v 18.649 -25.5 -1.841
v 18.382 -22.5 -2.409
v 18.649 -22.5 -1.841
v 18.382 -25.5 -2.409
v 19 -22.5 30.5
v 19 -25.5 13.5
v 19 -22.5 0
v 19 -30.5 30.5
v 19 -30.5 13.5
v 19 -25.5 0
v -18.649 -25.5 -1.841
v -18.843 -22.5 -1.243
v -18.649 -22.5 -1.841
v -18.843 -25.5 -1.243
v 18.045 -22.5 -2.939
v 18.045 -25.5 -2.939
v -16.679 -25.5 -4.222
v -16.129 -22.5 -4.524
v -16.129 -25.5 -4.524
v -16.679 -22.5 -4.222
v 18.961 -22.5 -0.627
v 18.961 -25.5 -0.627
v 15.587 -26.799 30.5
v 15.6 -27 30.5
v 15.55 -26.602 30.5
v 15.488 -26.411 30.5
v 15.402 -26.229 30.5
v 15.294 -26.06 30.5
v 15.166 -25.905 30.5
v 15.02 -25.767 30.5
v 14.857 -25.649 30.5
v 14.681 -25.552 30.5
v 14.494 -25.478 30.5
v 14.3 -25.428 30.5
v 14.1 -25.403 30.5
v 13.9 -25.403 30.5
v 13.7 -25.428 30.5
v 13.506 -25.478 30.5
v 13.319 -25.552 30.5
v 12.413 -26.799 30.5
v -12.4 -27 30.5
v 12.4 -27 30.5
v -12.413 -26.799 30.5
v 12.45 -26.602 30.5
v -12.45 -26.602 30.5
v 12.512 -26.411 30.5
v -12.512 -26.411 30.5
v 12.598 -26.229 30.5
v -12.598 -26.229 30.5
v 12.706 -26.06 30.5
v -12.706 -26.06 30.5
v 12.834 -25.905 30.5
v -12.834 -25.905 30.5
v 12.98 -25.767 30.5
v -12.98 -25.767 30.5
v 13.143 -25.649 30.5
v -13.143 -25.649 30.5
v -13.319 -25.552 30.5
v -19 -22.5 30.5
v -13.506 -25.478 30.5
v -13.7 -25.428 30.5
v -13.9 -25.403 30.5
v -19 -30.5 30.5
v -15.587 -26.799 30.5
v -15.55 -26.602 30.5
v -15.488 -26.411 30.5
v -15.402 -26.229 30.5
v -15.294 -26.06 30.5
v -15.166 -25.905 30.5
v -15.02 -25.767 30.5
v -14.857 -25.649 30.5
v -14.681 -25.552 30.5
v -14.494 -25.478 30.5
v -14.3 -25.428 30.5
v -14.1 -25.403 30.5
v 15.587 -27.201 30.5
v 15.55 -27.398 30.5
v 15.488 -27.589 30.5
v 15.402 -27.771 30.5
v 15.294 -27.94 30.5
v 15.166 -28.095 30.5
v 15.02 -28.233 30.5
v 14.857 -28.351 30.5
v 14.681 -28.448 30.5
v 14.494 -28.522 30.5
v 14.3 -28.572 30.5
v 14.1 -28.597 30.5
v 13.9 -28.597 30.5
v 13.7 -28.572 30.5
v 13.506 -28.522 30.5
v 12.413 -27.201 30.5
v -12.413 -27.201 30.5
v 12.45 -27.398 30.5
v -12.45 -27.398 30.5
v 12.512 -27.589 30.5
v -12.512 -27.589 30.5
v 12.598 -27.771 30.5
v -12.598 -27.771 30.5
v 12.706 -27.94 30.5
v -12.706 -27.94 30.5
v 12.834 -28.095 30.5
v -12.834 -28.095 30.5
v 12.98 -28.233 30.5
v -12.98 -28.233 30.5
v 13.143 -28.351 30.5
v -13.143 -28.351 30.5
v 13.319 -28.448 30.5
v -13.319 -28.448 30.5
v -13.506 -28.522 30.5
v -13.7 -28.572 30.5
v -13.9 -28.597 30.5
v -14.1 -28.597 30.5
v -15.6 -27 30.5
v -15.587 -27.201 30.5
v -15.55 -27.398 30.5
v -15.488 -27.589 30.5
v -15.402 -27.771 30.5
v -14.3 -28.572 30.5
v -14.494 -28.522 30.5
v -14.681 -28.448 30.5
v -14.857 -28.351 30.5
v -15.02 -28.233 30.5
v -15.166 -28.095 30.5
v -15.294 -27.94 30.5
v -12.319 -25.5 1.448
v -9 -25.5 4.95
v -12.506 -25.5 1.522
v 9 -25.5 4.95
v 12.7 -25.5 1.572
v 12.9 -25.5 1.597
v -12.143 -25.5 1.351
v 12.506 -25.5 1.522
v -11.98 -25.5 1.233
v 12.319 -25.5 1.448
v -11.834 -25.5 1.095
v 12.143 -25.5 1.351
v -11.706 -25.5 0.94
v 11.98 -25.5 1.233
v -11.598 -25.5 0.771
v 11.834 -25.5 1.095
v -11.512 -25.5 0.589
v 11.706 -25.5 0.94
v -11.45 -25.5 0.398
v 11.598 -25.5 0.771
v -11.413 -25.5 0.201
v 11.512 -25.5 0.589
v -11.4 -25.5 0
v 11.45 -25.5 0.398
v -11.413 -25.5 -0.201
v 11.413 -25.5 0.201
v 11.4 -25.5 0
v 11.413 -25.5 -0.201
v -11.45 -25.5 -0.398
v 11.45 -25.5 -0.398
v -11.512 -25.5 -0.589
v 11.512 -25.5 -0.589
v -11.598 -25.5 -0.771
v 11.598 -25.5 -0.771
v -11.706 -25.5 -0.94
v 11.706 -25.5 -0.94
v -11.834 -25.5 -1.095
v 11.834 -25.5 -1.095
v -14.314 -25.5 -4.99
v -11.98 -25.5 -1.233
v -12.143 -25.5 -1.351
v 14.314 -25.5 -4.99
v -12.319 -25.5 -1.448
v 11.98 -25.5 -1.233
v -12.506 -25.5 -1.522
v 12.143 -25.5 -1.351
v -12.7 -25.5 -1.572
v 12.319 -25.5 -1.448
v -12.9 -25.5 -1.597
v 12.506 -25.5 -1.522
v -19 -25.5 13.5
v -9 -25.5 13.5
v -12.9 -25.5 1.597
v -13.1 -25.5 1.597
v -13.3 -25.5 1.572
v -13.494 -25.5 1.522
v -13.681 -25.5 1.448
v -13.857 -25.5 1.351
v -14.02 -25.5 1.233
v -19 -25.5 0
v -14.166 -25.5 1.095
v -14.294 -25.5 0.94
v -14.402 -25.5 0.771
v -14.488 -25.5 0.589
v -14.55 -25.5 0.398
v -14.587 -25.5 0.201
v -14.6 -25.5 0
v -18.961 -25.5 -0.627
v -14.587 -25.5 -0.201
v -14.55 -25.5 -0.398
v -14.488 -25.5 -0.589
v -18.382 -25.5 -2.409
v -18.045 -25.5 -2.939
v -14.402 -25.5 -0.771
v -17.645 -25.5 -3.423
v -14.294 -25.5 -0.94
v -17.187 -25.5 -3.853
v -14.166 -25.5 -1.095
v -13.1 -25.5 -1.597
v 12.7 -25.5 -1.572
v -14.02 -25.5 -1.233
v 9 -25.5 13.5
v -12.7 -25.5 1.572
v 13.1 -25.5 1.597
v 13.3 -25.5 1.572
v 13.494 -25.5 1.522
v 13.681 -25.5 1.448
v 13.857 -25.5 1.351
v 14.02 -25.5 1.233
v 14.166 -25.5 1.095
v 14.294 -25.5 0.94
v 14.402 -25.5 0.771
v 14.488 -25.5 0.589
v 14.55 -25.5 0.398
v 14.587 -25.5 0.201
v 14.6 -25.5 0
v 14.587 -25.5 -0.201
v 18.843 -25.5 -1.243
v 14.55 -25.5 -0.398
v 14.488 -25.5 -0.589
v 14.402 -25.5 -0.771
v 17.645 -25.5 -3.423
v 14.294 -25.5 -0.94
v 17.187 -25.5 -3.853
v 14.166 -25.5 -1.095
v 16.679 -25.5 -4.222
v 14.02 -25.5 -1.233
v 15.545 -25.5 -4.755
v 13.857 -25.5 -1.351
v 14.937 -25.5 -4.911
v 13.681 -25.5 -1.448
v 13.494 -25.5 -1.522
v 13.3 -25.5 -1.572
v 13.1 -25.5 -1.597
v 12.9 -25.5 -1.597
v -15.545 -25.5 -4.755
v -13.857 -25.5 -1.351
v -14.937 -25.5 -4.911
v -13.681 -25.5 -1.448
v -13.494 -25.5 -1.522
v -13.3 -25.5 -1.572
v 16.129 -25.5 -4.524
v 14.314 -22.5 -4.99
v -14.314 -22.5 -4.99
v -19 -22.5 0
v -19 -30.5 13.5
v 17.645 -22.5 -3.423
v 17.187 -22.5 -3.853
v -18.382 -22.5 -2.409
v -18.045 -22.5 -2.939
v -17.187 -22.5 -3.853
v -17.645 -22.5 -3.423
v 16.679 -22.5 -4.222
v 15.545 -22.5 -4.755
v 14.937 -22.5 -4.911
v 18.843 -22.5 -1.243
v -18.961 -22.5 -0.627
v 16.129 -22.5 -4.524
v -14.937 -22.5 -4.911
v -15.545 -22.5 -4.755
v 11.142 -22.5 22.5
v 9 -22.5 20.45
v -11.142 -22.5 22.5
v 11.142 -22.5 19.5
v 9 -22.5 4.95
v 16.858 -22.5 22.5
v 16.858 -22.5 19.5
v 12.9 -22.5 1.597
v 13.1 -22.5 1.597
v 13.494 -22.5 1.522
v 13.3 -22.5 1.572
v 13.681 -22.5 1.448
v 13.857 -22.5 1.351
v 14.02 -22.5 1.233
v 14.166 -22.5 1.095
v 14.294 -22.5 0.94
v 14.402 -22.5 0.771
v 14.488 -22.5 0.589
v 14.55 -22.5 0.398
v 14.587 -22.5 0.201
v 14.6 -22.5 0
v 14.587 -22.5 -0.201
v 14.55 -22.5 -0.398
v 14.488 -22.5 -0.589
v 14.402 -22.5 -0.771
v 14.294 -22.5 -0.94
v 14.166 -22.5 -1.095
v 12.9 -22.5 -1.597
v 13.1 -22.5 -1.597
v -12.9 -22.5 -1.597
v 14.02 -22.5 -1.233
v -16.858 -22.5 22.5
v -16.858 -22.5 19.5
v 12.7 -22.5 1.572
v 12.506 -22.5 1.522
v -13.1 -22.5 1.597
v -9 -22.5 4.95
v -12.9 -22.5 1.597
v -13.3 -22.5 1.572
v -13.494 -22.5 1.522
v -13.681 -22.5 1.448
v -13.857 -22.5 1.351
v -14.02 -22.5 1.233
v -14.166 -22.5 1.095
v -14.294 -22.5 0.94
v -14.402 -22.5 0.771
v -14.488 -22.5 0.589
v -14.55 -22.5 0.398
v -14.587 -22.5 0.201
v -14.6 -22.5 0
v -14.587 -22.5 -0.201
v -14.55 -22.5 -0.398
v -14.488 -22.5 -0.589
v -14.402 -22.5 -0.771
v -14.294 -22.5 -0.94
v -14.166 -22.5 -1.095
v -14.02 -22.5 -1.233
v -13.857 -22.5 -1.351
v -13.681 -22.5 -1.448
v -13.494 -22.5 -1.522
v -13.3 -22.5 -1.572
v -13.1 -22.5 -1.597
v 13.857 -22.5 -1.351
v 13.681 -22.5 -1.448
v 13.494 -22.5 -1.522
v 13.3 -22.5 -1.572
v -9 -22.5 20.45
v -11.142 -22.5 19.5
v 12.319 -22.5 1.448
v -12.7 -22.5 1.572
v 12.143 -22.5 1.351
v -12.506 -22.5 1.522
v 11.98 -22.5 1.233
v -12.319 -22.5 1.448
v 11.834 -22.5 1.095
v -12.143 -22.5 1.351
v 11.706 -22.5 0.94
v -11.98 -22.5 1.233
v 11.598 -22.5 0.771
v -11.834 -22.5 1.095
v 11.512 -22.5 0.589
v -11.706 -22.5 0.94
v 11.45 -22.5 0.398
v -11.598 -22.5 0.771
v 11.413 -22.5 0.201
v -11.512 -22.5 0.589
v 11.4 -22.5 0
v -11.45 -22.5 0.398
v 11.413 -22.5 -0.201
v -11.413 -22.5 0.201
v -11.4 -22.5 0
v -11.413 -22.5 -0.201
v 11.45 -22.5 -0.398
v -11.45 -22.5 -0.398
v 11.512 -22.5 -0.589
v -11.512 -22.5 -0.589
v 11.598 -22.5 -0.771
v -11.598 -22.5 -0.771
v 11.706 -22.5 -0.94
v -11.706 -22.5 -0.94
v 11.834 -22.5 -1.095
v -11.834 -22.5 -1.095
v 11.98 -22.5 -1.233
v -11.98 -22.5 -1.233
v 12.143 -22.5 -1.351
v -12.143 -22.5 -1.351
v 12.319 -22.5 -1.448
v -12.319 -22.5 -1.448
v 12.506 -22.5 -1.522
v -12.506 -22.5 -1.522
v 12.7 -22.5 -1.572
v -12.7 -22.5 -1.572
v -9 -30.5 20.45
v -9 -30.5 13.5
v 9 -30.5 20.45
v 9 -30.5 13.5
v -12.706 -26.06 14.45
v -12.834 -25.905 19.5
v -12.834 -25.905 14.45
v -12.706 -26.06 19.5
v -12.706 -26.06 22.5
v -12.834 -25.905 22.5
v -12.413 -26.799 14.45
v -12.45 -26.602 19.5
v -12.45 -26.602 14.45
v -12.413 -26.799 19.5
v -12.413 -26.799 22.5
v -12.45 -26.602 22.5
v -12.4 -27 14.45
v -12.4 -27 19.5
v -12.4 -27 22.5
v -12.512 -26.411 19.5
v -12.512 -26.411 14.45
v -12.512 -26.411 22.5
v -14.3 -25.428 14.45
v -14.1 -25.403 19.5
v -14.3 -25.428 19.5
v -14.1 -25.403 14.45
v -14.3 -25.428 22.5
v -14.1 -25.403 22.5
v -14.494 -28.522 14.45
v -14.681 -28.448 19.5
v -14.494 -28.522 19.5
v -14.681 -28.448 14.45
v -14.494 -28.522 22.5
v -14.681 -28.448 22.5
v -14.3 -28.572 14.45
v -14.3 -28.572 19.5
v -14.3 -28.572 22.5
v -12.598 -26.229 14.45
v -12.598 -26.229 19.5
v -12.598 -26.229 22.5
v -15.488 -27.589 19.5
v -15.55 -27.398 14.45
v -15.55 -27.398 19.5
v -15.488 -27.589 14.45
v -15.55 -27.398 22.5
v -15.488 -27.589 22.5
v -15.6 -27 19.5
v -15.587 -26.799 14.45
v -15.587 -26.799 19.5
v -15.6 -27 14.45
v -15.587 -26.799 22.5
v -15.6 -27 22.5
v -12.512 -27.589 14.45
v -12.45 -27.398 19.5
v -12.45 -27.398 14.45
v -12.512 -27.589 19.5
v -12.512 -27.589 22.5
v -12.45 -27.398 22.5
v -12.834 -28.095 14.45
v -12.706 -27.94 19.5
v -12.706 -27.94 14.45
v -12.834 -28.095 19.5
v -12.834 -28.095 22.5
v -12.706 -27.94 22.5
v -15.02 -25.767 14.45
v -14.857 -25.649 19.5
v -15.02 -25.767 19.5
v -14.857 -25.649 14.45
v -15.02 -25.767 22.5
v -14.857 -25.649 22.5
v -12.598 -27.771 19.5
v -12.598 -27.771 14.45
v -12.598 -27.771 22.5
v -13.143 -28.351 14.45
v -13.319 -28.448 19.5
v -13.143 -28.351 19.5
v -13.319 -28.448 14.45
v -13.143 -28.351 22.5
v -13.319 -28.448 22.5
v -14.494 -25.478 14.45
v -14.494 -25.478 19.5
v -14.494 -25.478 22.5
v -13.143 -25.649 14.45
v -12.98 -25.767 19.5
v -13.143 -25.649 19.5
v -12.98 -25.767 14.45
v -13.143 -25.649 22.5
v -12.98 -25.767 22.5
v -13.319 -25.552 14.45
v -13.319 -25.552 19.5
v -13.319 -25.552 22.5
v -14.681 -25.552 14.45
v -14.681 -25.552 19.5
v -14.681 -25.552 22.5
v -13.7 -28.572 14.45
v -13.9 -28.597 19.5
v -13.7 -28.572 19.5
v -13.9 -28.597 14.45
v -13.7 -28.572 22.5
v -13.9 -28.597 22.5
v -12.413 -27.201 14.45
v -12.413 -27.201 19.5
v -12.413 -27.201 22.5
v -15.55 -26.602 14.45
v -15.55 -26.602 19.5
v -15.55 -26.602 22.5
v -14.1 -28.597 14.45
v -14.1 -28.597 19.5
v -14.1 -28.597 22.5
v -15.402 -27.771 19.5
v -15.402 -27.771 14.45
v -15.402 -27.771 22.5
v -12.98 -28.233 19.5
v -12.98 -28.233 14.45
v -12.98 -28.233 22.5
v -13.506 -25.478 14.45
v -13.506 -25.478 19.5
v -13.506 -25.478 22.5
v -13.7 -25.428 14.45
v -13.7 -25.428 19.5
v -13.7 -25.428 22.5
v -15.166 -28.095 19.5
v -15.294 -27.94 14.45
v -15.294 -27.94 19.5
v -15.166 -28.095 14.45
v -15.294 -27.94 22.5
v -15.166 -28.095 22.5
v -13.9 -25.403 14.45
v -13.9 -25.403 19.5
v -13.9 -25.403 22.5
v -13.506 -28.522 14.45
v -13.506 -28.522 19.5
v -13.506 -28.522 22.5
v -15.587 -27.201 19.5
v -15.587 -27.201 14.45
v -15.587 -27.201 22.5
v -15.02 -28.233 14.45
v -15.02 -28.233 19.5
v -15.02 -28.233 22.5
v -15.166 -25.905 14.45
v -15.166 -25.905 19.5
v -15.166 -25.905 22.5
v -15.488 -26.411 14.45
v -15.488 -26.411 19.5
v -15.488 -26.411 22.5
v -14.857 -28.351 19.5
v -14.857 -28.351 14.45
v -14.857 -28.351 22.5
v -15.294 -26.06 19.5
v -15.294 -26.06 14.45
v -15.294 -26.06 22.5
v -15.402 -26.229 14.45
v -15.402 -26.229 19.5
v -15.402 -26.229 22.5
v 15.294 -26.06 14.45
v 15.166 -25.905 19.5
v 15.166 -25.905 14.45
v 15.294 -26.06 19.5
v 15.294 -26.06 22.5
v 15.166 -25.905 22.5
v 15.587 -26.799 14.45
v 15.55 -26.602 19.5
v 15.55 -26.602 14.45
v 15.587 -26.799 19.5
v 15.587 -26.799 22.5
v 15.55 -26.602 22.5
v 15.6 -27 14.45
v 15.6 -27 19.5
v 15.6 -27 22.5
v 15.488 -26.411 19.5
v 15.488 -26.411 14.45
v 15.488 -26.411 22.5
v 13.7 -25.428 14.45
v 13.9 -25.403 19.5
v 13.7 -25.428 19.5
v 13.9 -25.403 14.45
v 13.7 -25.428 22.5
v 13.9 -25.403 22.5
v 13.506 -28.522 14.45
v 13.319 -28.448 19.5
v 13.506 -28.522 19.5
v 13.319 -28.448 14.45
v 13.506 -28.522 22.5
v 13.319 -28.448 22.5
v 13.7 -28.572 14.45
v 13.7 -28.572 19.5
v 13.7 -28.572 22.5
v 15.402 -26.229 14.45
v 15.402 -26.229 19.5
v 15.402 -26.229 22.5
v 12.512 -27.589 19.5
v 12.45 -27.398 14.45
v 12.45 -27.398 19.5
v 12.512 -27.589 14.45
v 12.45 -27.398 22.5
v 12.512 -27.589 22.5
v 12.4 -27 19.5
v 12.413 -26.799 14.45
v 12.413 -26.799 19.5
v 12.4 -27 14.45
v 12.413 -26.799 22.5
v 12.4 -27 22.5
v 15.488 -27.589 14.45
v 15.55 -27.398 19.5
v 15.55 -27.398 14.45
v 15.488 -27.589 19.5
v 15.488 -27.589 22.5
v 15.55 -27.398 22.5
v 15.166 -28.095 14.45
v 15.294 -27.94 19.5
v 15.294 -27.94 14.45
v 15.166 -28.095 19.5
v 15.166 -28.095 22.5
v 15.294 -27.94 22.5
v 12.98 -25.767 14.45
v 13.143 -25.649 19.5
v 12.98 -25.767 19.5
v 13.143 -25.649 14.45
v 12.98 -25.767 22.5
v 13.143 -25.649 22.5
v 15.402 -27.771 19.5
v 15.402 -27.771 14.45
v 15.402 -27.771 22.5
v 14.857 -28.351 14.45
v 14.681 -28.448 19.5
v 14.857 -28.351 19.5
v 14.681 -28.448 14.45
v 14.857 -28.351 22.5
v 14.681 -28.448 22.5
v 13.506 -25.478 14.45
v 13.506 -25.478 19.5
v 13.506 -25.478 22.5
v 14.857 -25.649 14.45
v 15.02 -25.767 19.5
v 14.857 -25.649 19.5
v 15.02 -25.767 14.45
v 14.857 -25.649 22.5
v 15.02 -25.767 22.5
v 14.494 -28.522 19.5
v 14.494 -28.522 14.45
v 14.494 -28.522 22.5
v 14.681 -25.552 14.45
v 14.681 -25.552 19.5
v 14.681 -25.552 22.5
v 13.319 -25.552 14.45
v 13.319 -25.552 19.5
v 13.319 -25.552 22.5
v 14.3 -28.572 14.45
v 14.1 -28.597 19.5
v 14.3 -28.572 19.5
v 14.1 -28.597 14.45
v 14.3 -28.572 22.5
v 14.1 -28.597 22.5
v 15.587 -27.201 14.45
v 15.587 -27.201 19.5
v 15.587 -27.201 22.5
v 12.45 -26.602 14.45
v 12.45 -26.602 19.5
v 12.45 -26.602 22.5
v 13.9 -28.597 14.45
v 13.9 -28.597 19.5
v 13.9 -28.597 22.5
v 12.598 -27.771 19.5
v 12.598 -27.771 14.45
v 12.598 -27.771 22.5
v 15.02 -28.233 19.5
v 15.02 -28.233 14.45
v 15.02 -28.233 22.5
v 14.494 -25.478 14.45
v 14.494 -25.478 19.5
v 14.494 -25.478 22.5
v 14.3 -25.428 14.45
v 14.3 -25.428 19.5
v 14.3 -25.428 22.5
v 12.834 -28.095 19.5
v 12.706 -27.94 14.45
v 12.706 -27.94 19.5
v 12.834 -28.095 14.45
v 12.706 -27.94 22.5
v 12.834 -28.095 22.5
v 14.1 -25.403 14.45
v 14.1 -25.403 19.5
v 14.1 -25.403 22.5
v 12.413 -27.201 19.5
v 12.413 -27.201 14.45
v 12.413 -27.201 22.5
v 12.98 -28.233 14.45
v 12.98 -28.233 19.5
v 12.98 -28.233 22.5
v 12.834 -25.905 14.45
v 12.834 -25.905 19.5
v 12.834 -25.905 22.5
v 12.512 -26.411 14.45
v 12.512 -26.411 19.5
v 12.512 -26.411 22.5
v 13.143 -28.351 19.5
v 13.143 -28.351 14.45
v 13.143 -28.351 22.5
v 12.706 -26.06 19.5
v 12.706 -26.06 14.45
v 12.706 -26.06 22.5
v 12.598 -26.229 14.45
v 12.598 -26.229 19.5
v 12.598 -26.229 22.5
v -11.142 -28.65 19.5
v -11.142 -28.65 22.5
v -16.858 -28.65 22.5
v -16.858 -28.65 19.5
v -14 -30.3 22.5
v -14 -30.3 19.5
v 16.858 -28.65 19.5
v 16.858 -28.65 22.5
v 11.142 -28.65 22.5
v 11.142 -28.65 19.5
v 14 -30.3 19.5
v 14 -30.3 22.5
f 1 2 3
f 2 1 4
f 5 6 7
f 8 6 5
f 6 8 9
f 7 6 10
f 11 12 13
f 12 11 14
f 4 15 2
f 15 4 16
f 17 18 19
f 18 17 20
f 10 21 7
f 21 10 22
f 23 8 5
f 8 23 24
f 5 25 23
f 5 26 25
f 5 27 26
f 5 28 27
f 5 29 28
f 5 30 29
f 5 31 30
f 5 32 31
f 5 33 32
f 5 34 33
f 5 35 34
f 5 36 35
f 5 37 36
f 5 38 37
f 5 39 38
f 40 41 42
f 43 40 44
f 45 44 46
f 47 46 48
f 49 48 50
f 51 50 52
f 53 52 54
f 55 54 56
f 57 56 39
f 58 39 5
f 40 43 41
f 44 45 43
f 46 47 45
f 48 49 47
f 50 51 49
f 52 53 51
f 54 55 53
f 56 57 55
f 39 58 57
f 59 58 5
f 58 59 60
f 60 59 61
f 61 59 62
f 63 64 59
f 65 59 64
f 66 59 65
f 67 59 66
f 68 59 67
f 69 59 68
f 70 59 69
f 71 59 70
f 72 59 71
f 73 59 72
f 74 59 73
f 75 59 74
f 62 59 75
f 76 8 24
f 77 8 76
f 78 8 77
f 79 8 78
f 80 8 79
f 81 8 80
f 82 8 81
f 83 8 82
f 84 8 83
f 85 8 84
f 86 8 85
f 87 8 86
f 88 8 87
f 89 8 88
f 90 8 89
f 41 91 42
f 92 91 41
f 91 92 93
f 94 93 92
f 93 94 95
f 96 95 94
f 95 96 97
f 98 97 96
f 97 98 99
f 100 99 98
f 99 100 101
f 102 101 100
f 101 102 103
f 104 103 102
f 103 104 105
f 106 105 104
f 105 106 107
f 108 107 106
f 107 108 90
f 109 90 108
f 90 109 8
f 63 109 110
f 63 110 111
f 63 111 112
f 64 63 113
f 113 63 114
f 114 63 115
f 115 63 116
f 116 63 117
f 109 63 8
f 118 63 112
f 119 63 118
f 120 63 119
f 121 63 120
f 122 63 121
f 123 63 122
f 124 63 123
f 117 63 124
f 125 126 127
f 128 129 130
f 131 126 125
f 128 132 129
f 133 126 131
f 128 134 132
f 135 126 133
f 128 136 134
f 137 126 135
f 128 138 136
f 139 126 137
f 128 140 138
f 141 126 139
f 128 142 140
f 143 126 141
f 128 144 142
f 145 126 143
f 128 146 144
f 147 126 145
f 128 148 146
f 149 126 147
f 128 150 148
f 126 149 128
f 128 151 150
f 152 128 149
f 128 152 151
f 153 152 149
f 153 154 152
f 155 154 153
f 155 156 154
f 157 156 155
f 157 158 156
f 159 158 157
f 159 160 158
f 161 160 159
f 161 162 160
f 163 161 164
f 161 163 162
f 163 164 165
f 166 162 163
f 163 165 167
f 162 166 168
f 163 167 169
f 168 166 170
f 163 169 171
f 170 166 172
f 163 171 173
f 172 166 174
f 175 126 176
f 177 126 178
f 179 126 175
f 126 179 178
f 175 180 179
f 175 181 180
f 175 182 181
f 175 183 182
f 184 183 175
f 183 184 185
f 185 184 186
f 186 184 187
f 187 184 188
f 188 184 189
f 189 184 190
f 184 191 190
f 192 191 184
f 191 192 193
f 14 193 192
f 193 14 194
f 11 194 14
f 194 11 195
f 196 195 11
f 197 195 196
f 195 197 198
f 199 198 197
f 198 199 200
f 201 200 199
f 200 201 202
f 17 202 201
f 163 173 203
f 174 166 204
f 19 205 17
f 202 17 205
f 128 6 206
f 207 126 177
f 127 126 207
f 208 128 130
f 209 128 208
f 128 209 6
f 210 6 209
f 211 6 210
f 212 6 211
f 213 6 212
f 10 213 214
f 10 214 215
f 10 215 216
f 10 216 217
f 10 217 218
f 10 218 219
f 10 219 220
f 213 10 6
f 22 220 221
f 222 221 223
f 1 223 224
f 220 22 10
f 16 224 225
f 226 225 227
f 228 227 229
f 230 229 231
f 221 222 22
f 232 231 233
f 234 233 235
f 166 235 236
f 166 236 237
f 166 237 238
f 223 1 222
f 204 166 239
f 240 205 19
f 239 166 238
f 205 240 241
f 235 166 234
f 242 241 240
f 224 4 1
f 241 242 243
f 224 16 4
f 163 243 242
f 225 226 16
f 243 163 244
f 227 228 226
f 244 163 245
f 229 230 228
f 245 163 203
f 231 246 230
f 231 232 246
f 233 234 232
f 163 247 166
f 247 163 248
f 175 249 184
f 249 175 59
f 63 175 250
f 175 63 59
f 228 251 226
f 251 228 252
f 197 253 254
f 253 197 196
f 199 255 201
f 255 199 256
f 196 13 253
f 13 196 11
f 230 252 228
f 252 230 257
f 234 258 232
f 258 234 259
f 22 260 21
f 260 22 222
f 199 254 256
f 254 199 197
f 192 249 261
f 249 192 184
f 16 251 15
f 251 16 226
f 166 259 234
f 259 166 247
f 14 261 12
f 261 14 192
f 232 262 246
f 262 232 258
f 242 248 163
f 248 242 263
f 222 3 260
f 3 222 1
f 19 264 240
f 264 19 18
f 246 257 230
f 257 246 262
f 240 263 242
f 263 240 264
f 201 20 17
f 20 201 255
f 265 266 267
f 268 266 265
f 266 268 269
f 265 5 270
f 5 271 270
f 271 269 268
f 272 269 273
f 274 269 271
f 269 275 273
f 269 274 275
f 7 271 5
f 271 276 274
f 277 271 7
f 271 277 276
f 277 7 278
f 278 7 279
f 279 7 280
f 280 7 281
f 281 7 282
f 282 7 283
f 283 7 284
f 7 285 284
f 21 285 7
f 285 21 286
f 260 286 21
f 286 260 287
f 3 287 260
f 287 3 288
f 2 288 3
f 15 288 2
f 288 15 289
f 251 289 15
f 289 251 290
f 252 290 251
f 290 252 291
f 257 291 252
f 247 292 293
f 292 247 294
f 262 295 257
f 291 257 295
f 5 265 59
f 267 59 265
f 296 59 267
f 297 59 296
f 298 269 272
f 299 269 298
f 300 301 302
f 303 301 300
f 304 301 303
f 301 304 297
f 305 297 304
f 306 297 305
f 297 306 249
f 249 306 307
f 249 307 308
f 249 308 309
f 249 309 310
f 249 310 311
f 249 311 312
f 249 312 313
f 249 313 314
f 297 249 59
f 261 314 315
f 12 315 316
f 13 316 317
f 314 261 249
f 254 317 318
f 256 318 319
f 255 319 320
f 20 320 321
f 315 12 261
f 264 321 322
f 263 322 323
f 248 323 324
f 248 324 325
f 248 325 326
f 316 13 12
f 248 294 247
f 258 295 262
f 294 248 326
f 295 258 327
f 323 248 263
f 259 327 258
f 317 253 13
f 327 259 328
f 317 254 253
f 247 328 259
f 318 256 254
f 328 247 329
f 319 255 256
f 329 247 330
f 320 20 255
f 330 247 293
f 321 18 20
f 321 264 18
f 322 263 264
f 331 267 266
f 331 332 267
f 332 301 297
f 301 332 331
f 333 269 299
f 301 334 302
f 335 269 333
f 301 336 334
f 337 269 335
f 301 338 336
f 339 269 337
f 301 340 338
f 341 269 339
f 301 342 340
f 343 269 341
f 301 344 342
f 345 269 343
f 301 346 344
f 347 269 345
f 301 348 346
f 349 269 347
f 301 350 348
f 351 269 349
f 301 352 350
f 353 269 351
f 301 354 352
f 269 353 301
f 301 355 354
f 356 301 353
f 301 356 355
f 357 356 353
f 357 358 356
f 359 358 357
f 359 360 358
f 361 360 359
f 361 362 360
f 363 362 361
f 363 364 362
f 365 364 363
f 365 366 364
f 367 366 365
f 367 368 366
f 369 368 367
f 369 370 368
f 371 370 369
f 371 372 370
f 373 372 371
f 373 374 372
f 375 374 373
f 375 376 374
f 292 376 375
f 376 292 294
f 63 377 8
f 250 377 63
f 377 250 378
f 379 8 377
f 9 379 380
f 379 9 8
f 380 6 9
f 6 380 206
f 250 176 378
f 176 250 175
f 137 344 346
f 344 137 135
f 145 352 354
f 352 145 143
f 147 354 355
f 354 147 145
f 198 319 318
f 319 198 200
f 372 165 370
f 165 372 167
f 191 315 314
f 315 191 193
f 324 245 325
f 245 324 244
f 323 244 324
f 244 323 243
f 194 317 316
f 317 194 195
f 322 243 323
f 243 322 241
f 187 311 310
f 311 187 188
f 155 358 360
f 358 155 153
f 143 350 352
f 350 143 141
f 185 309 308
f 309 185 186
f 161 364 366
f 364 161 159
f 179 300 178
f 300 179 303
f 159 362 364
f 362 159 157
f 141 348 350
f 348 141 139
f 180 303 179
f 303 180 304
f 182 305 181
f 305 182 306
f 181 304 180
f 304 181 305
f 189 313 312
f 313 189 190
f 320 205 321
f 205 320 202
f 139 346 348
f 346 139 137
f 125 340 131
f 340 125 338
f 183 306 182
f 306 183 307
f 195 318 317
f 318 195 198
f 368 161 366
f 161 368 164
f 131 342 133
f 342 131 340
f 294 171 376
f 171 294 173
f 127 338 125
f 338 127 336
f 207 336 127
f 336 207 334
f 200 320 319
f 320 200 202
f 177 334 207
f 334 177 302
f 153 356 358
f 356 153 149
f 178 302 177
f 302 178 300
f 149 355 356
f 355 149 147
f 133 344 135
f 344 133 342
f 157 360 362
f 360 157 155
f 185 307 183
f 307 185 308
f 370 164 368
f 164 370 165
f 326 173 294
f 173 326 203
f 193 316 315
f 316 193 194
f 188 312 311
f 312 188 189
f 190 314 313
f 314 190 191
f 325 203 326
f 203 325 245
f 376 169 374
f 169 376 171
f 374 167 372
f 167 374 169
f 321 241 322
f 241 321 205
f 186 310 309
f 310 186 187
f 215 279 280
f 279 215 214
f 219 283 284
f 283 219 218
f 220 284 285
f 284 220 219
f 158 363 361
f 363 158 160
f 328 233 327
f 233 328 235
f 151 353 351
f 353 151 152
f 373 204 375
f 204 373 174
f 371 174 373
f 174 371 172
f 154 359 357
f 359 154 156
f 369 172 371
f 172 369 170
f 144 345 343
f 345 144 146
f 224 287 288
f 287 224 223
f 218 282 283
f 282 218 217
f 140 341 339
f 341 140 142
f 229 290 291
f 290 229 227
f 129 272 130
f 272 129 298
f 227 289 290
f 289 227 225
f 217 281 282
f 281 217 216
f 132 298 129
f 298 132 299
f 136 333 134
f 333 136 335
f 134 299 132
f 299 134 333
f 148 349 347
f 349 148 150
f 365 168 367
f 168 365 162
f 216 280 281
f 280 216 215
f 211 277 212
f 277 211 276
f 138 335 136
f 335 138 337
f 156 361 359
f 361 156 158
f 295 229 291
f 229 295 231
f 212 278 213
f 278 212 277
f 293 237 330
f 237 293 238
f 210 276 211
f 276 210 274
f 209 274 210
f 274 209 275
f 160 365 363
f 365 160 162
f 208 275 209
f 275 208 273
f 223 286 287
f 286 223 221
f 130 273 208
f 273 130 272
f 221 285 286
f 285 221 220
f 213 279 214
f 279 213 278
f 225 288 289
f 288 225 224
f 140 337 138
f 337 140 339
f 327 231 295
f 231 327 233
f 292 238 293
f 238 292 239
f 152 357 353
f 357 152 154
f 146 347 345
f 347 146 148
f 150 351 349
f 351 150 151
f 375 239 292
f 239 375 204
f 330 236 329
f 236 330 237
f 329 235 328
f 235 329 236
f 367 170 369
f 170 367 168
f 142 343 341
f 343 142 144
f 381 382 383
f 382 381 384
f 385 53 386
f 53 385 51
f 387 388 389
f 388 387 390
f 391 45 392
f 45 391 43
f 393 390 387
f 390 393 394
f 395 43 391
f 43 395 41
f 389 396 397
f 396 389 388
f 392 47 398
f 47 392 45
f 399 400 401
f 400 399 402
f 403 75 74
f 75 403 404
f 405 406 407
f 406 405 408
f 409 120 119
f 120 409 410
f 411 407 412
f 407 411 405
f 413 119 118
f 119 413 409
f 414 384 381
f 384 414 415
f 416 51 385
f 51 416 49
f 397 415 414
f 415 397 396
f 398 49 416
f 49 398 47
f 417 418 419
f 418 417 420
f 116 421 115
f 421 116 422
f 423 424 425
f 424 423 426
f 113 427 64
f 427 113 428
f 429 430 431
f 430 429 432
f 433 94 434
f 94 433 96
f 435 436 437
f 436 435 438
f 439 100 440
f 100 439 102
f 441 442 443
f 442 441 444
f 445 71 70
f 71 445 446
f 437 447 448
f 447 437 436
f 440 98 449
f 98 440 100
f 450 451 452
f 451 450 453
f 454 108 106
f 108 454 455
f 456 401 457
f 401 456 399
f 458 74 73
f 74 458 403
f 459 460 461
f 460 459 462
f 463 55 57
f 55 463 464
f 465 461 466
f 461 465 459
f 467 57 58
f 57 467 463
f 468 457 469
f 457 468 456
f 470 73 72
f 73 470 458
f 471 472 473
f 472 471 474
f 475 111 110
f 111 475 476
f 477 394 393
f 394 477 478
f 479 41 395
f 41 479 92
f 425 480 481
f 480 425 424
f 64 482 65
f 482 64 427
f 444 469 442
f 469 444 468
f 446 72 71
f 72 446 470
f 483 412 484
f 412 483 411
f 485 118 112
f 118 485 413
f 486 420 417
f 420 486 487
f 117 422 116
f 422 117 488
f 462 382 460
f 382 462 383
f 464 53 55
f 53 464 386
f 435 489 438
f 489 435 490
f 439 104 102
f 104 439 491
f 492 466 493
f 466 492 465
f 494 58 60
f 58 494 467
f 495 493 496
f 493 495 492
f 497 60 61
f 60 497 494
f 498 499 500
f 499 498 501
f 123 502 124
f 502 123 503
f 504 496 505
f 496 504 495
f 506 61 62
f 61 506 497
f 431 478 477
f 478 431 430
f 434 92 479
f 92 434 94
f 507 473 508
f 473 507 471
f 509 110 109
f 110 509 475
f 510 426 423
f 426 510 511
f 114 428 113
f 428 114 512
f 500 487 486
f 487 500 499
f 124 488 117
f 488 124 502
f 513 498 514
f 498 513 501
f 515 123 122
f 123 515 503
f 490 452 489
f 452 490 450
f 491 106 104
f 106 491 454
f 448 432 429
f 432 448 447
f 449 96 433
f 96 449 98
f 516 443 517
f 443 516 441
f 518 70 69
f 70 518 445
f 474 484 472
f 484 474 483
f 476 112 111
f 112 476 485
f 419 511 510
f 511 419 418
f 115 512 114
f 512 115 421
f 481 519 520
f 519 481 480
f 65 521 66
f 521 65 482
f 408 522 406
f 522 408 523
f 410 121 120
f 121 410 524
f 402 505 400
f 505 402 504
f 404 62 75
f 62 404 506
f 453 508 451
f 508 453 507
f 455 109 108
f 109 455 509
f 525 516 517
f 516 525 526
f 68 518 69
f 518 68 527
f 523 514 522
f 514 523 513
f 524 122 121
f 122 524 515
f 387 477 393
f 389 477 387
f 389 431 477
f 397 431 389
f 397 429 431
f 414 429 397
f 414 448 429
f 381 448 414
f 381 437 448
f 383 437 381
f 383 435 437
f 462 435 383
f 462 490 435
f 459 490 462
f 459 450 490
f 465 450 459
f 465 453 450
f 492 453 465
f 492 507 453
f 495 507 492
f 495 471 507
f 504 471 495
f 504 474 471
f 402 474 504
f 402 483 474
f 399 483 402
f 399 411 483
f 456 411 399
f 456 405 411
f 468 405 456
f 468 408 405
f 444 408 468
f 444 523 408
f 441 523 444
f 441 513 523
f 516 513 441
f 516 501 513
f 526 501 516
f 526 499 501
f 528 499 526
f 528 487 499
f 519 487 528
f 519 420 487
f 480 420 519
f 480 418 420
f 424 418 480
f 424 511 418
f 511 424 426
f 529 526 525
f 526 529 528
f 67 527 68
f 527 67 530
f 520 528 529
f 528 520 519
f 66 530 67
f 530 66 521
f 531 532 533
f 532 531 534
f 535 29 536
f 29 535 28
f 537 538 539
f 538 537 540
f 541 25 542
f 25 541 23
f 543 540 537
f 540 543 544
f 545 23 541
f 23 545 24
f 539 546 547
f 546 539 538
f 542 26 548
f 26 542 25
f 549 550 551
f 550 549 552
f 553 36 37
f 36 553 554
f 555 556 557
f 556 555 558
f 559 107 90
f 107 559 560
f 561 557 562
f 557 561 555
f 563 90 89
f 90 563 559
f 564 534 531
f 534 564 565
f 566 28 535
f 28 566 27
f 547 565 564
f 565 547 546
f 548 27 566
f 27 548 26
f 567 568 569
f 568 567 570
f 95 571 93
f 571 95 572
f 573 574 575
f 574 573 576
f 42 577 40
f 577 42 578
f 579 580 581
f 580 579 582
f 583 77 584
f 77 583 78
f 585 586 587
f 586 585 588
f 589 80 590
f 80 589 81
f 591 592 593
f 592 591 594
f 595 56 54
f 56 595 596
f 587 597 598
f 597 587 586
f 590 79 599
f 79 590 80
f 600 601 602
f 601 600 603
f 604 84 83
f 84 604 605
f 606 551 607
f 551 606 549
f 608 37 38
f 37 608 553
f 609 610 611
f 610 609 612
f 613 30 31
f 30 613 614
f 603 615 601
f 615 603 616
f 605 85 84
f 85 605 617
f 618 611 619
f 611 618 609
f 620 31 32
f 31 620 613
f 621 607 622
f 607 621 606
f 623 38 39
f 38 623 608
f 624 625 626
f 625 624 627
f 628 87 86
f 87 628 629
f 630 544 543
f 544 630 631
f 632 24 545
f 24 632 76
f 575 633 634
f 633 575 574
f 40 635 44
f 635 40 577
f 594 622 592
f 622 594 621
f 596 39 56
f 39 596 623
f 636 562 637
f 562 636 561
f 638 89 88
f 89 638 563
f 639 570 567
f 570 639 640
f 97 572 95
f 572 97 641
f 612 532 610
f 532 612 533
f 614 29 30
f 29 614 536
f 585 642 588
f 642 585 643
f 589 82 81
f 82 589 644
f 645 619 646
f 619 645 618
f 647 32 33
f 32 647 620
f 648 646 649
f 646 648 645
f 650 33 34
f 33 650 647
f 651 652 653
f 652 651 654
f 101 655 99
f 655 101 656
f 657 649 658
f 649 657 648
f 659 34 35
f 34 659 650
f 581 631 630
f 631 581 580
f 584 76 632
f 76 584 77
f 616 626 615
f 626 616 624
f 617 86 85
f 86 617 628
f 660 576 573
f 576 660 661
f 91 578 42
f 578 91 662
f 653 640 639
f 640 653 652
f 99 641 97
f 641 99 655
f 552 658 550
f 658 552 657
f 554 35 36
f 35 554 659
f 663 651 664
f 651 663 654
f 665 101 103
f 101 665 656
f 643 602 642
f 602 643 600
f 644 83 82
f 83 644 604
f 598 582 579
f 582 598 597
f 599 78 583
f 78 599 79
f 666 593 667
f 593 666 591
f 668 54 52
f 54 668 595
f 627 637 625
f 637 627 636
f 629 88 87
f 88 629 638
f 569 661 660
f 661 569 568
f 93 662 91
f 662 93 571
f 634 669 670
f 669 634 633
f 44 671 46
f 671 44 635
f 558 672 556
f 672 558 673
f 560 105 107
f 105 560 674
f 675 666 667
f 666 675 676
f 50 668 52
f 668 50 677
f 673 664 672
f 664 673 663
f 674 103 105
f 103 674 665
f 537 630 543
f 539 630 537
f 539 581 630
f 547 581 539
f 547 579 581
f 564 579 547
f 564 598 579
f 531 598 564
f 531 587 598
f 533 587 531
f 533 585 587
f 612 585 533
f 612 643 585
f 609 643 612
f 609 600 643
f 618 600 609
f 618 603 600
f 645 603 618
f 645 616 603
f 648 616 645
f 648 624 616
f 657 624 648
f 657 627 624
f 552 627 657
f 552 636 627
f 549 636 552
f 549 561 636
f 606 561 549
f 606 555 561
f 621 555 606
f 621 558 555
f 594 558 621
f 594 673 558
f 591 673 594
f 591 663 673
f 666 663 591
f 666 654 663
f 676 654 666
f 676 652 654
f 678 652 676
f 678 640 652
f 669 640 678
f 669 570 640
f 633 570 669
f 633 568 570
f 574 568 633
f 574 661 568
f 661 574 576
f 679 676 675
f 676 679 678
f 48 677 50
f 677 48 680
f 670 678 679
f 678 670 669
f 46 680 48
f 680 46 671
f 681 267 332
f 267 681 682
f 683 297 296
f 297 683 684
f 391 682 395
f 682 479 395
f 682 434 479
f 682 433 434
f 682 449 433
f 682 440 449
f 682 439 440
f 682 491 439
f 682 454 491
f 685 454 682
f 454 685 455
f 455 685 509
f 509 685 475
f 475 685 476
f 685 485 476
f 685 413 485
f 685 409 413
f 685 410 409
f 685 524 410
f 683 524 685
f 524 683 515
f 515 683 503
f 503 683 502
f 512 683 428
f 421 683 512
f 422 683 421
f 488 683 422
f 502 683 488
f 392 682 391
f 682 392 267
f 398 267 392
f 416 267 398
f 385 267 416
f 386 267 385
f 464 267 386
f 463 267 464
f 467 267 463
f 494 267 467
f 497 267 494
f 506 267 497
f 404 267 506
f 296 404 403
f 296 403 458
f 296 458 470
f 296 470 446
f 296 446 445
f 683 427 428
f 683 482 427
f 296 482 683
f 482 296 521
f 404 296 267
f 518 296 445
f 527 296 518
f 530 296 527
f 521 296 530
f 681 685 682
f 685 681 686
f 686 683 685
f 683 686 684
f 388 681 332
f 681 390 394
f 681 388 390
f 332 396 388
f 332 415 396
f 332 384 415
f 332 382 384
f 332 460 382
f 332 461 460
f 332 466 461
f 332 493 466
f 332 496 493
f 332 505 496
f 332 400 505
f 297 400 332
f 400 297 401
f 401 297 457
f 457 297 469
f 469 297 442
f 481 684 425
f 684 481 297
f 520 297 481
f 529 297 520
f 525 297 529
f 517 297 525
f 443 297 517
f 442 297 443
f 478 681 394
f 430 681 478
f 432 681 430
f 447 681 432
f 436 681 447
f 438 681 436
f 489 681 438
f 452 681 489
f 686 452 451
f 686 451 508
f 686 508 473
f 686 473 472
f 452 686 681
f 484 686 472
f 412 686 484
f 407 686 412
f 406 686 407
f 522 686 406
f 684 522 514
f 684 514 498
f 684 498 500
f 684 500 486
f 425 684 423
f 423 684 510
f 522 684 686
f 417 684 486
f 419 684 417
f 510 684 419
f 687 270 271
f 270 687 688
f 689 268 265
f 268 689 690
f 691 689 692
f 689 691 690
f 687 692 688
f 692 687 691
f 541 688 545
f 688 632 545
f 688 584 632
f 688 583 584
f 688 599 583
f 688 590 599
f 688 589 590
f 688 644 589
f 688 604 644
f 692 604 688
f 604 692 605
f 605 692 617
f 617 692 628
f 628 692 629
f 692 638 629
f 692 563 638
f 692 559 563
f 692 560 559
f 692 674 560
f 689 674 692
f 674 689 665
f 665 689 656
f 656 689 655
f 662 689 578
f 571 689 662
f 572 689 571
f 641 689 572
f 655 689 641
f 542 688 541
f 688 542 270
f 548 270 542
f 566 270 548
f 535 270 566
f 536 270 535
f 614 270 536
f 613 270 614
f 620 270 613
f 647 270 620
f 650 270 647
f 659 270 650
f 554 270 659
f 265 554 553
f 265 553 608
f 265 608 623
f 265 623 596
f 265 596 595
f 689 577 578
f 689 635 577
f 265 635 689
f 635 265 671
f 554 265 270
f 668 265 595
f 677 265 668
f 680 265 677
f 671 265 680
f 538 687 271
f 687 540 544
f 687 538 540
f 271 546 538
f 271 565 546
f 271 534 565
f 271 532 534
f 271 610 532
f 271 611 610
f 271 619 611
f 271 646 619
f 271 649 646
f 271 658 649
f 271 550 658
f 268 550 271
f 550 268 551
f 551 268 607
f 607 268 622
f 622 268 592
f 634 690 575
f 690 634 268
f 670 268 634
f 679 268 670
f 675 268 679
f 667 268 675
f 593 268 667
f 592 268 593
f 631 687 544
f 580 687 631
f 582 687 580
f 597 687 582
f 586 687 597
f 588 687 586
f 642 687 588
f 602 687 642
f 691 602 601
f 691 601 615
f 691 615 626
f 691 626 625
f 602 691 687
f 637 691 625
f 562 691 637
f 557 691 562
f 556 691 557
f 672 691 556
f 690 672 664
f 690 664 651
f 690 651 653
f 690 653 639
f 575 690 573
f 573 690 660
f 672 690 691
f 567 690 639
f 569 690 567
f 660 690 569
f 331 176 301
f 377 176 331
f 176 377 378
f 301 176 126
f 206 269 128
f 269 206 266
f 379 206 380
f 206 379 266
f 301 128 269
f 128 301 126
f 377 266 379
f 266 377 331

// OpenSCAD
/********************************************************
This file is part of the RepRapPNP project, developed at the University of Hamburg.
Author: Daniel Ahlers <Danielahlers@googlemail.com> 
License: 'GNU Affero General Public License AGPLv3 http://www.gnu.org/licenses/agpl.html' 
*******************************************************/

// general object resolution
$fn = 50;

// camera visualization
//include <../cameras/sanyo/HD2100P.scad>;
//%rotate([180,0,0]) HD2100P();
//%translate([0, 0, 2.5]) {
//    include <../cameras/lens_adapter.scad>;
//}
//%rotate([0, 90, 0]) translate([-5, 0, 0])import("basler/Basler Lens 8mm C-Mount v02.stl");
//%translate([0,0,33+2.7]) rotate([180, 0, 0])  {
//    include <../cameras/basler/lens_cover_ring.scad>;
//}



module camera_mount(t,r_h){
    translate([0,-45/2, 25.5]) {
        difference() {
            union(){
                hull() {
                    for(i=[-1, 1]) {
                        translate([i*(28/2), -t/2, -30.5+5]) rotate([90, 0, 0]) cylinder(r=5, h=t, center=true);
                        translate([i*(28/2), -t/2, 0]) rotate([90, 0, 0]) cube([10,10, t], center=true);
                    }
                }
                hull() {
                    translate([0, -t-(8-t)/2, -5+1.5]) cube([28+10,8-t,17], center=true);
                    translate([0,-t/2,-11]) cube([28+10,t,1], center=true);
                }
            }   
            translate([0, -t/2, -12.8]) rotate([90, 0, 0]) cube([18,15.5,t+30], center=true);
              for(i=[-1, 1]) {
                  translate([i*(26/2), 0, -30.5+5]) rotate([90, 0, 0]) cylinder(r=r_h, h=t*3, center=true);
              }
              for(i=[-1, 1]) {
                  translate([i*(28/2), -4.5, 5-8]) cylinder(r=r_h, h=16.1, center=true);
              }
              for(i=[-1, 1]) {
                  for(j=[0,2,t+2]) {
                  translate([i*(28/2), -4.5+j, 5-1.5-8]) rotate([0, 0, 90]) cylinder(r=3.3,h=3,$fn =6, center=true);
                  }
              }
        }
   }
}

camera_mount(3,1.6);
